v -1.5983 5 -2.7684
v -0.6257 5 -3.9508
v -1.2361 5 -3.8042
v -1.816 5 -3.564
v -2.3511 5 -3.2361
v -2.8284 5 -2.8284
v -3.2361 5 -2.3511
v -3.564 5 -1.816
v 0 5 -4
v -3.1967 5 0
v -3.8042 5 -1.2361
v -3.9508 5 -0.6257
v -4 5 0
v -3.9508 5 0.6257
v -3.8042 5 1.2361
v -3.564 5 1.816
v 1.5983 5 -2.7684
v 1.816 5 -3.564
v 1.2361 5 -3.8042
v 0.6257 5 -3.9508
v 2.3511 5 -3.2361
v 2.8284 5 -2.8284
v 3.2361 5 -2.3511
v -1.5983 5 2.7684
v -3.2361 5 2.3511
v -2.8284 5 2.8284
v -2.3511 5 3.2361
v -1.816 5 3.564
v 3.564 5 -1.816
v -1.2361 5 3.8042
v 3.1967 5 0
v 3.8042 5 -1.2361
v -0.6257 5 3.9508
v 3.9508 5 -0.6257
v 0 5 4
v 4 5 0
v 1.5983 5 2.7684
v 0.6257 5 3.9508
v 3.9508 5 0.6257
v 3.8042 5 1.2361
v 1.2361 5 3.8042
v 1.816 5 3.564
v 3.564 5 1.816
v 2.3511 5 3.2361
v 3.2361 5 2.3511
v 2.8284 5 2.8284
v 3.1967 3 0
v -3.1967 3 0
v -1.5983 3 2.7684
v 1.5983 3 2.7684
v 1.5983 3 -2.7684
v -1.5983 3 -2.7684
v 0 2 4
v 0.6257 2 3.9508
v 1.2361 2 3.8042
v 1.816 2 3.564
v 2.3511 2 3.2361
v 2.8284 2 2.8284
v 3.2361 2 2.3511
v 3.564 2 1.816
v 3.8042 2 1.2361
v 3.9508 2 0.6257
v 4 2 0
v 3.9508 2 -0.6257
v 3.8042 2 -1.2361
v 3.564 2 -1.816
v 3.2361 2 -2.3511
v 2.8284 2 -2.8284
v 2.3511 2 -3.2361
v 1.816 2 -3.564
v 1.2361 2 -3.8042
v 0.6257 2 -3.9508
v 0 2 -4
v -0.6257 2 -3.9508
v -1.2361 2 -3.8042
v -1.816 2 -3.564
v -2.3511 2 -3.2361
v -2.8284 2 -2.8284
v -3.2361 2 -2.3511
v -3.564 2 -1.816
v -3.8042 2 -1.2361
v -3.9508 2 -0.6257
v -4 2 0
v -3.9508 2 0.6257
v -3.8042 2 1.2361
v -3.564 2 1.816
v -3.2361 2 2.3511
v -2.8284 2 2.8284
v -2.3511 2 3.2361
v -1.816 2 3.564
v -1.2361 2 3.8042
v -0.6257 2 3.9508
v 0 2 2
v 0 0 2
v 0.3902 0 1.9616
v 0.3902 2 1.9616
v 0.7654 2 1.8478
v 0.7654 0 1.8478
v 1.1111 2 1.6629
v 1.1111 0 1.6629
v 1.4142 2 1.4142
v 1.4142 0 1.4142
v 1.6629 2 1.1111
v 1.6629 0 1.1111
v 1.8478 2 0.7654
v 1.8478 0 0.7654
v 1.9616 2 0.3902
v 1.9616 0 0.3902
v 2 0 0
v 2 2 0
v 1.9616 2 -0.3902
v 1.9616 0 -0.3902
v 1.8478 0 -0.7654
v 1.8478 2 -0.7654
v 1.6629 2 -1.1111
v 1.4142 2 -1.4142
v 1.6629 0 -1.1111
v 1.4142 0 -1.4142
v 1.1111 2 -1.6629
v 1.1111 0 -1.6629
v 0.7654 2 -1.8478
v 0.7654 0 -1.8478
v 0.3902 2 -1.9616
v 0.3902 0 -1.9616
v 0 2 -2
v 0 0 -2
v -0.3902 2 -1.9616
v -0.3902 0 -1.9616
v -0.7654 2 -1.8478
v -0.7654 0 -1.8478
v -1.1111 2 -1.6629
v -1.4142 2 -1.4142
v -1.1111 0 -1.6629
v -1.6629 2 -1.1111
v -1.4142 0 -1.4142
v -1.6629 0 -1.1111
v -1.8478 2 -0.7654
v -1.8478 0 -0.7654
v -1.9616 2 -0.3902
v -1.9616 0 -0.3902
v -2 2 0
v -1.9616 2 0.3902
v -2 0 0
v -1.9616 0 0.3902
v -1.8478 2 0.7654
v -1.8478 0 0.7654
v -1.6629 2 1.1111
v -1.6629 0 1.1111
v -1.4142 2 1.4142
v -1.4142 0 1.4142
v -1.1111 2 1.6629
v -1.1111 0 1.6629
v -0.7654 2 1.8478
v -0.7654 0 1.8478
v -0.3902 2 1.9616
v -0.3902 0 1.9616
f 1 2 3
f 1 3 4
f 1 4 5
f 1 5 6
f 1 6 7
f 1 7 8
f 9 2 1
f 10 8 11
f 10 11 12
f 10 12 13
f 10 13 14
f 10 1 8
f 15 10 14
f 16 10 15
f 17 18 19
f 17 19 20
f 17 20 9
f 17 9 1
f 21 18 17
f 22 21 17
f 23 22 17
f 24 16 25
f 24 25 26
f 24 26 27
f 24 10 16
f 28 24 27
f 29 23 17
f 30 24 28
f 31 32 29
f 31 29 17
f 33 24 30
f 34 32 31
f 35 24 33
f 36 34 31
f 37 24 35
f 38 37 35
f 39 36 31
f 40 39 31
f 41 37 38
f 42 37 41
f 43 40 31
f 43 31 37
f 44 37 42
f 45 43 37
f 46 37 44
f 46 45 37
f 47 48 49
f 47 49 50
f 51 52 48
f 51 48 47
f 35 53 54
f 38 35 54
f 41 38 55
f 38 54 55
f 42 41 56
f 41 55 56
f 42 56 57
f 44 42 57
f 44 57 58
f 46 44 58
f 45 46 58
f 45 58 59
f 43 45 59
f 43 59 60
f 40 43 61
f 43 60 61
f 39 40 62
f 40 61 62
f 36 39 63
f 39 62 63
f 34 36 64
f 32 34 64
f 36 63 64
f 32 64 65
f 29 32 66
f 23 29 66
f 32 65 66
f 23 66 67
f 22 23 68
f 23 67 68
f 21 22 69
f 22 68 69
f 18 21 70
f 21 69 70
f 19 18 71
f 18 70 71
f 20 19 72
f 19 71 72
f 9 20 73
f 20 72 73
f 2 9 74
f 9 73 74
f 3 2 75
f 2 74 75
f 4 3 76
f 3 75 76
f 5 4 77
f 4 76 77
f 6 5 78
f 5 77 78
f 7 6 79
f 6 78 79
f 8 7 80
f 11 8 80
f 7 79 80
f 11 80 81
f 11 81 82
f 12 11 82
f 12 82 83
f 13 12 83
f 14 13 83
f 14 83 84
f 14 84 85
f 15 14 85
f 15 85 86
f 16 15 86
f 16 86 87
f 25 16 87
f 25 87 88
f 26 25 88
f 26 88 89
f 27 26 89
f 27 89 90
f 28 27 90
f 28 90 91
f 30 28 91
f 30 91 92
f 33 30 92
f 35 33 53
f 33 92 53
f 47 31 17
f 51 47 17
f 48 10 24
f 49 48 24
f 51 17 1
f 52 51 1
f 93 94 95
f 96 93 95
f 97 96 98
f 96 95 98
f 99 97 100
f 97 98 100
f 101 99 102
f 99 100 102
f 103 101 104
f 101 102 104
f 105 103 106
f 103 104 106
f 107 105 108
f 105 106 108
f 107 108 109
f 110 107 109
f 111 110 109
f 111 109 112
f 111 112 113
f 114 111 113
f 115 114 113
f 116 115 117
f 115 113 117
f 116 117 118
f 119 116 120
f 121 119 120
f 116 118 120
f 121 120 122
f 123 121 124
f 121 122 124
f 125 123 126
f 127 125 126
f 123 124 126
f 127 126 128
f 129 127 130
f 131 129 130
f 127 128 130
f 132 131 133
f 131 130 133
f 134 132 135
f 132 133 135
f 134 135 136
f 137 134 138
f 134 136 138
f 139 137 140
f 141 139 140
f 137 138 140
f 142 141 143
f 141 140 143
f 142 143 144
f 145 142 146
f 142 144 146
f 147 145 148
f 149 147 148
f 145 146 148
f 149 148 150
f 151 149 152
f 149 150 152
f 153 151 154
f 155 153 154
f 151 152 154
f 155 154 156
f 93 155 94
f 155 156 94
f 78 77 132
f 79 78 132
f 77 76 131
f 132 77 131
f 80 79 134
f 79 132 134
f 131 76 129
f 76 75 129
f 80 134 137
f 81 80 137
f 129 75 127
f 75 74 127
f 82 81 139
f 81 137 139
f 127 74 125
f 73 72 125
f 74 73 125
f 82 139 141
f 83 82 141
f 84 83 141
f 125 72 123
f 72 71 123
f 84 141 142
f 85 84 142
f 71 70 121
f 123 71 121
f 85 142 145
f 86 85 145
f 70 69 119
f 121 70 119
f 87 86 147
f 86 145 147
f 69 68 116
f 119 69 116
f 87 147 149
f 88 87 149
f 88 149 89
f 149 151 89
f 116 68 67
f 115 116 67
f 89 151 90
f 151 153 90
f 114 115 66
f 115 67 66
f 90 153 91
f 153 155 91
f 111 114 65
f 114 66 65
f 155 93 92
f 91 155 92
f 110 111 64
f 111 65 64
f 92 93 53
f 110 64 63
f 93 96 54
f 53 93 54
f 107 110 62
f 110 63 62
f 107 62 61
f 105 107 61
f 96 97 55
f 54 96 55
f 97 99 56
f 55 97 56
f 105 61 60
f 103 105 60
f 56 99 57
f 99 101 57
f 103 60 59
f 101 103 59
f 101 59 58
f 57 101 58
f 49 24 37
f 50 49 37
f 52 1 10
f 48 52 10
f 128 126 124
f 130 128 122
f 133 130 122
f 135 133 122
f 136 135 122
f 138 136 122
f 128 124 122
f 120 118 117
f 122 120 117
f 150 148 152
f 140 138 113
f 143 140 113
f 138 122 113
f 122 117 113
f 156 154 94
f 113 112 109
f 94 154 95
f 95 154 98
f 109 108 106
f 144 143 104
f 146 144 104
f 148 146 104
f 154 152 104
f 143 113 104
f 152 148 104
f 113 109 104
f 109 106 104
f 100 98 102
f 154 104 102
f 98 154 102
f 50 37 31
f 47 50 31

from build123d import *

# Parameters (mm, degrees)
SKETCH1_R           = 2
BOSS_EXTRUDE1_DEPTH = 2
SKETCH2_R           = 4
BOSS_EXTRUDE2_DEPTH = 3
CUT_EXTRUDE1_DEPTH  = 2


with BuildPart() as part:
    # Sketch1 → Boss-Extrude1 (new body)
    with BuildSketch(Plane(origin=(0, 0, 0), x_dir=(1, 0, 0), z_dir=(0, 1, 0))):
        with Locations(Location((0, 0, 0), (0, 0, 270))):
            Circle(SKETCH1_R)
    extrude(amount=BOSS_EXTRUDE1_DEPTH)

    # Sketch2 → Boss-Extrude2 (add)
    with BuildSketch(Plane(origin=(0, 2, 0), x_dir=(1, 0, 0), z_dir=(0, 1, 0))):
        with Locations(Location((0, 0, 0), (0, 0, 270))):
            Circle(SKETCH2_R)
    extrude(amount=BOSS_EXTRUDE2_DEPTH)

    # Sketch3 → Cut-Extrude1 (cut)
    with BuildSketch(Plane(origin=(0, 5, 0), x_dir=(1, 0, 0), z_dir=(0, 1, 0))):
        Polygon((3.19667155, 0), (1.598335775, 2.76839877), (-1.598335775, 2.76839877), (-3.19667155, 0), (-1.598335775, -2.76839877), (1.598335775, -2.76839877), align=None)
    extrude(amount=-CUT_EXTRUDE1_DEPTH, mode=Mode.SUBTRACT)


solid = part.part
